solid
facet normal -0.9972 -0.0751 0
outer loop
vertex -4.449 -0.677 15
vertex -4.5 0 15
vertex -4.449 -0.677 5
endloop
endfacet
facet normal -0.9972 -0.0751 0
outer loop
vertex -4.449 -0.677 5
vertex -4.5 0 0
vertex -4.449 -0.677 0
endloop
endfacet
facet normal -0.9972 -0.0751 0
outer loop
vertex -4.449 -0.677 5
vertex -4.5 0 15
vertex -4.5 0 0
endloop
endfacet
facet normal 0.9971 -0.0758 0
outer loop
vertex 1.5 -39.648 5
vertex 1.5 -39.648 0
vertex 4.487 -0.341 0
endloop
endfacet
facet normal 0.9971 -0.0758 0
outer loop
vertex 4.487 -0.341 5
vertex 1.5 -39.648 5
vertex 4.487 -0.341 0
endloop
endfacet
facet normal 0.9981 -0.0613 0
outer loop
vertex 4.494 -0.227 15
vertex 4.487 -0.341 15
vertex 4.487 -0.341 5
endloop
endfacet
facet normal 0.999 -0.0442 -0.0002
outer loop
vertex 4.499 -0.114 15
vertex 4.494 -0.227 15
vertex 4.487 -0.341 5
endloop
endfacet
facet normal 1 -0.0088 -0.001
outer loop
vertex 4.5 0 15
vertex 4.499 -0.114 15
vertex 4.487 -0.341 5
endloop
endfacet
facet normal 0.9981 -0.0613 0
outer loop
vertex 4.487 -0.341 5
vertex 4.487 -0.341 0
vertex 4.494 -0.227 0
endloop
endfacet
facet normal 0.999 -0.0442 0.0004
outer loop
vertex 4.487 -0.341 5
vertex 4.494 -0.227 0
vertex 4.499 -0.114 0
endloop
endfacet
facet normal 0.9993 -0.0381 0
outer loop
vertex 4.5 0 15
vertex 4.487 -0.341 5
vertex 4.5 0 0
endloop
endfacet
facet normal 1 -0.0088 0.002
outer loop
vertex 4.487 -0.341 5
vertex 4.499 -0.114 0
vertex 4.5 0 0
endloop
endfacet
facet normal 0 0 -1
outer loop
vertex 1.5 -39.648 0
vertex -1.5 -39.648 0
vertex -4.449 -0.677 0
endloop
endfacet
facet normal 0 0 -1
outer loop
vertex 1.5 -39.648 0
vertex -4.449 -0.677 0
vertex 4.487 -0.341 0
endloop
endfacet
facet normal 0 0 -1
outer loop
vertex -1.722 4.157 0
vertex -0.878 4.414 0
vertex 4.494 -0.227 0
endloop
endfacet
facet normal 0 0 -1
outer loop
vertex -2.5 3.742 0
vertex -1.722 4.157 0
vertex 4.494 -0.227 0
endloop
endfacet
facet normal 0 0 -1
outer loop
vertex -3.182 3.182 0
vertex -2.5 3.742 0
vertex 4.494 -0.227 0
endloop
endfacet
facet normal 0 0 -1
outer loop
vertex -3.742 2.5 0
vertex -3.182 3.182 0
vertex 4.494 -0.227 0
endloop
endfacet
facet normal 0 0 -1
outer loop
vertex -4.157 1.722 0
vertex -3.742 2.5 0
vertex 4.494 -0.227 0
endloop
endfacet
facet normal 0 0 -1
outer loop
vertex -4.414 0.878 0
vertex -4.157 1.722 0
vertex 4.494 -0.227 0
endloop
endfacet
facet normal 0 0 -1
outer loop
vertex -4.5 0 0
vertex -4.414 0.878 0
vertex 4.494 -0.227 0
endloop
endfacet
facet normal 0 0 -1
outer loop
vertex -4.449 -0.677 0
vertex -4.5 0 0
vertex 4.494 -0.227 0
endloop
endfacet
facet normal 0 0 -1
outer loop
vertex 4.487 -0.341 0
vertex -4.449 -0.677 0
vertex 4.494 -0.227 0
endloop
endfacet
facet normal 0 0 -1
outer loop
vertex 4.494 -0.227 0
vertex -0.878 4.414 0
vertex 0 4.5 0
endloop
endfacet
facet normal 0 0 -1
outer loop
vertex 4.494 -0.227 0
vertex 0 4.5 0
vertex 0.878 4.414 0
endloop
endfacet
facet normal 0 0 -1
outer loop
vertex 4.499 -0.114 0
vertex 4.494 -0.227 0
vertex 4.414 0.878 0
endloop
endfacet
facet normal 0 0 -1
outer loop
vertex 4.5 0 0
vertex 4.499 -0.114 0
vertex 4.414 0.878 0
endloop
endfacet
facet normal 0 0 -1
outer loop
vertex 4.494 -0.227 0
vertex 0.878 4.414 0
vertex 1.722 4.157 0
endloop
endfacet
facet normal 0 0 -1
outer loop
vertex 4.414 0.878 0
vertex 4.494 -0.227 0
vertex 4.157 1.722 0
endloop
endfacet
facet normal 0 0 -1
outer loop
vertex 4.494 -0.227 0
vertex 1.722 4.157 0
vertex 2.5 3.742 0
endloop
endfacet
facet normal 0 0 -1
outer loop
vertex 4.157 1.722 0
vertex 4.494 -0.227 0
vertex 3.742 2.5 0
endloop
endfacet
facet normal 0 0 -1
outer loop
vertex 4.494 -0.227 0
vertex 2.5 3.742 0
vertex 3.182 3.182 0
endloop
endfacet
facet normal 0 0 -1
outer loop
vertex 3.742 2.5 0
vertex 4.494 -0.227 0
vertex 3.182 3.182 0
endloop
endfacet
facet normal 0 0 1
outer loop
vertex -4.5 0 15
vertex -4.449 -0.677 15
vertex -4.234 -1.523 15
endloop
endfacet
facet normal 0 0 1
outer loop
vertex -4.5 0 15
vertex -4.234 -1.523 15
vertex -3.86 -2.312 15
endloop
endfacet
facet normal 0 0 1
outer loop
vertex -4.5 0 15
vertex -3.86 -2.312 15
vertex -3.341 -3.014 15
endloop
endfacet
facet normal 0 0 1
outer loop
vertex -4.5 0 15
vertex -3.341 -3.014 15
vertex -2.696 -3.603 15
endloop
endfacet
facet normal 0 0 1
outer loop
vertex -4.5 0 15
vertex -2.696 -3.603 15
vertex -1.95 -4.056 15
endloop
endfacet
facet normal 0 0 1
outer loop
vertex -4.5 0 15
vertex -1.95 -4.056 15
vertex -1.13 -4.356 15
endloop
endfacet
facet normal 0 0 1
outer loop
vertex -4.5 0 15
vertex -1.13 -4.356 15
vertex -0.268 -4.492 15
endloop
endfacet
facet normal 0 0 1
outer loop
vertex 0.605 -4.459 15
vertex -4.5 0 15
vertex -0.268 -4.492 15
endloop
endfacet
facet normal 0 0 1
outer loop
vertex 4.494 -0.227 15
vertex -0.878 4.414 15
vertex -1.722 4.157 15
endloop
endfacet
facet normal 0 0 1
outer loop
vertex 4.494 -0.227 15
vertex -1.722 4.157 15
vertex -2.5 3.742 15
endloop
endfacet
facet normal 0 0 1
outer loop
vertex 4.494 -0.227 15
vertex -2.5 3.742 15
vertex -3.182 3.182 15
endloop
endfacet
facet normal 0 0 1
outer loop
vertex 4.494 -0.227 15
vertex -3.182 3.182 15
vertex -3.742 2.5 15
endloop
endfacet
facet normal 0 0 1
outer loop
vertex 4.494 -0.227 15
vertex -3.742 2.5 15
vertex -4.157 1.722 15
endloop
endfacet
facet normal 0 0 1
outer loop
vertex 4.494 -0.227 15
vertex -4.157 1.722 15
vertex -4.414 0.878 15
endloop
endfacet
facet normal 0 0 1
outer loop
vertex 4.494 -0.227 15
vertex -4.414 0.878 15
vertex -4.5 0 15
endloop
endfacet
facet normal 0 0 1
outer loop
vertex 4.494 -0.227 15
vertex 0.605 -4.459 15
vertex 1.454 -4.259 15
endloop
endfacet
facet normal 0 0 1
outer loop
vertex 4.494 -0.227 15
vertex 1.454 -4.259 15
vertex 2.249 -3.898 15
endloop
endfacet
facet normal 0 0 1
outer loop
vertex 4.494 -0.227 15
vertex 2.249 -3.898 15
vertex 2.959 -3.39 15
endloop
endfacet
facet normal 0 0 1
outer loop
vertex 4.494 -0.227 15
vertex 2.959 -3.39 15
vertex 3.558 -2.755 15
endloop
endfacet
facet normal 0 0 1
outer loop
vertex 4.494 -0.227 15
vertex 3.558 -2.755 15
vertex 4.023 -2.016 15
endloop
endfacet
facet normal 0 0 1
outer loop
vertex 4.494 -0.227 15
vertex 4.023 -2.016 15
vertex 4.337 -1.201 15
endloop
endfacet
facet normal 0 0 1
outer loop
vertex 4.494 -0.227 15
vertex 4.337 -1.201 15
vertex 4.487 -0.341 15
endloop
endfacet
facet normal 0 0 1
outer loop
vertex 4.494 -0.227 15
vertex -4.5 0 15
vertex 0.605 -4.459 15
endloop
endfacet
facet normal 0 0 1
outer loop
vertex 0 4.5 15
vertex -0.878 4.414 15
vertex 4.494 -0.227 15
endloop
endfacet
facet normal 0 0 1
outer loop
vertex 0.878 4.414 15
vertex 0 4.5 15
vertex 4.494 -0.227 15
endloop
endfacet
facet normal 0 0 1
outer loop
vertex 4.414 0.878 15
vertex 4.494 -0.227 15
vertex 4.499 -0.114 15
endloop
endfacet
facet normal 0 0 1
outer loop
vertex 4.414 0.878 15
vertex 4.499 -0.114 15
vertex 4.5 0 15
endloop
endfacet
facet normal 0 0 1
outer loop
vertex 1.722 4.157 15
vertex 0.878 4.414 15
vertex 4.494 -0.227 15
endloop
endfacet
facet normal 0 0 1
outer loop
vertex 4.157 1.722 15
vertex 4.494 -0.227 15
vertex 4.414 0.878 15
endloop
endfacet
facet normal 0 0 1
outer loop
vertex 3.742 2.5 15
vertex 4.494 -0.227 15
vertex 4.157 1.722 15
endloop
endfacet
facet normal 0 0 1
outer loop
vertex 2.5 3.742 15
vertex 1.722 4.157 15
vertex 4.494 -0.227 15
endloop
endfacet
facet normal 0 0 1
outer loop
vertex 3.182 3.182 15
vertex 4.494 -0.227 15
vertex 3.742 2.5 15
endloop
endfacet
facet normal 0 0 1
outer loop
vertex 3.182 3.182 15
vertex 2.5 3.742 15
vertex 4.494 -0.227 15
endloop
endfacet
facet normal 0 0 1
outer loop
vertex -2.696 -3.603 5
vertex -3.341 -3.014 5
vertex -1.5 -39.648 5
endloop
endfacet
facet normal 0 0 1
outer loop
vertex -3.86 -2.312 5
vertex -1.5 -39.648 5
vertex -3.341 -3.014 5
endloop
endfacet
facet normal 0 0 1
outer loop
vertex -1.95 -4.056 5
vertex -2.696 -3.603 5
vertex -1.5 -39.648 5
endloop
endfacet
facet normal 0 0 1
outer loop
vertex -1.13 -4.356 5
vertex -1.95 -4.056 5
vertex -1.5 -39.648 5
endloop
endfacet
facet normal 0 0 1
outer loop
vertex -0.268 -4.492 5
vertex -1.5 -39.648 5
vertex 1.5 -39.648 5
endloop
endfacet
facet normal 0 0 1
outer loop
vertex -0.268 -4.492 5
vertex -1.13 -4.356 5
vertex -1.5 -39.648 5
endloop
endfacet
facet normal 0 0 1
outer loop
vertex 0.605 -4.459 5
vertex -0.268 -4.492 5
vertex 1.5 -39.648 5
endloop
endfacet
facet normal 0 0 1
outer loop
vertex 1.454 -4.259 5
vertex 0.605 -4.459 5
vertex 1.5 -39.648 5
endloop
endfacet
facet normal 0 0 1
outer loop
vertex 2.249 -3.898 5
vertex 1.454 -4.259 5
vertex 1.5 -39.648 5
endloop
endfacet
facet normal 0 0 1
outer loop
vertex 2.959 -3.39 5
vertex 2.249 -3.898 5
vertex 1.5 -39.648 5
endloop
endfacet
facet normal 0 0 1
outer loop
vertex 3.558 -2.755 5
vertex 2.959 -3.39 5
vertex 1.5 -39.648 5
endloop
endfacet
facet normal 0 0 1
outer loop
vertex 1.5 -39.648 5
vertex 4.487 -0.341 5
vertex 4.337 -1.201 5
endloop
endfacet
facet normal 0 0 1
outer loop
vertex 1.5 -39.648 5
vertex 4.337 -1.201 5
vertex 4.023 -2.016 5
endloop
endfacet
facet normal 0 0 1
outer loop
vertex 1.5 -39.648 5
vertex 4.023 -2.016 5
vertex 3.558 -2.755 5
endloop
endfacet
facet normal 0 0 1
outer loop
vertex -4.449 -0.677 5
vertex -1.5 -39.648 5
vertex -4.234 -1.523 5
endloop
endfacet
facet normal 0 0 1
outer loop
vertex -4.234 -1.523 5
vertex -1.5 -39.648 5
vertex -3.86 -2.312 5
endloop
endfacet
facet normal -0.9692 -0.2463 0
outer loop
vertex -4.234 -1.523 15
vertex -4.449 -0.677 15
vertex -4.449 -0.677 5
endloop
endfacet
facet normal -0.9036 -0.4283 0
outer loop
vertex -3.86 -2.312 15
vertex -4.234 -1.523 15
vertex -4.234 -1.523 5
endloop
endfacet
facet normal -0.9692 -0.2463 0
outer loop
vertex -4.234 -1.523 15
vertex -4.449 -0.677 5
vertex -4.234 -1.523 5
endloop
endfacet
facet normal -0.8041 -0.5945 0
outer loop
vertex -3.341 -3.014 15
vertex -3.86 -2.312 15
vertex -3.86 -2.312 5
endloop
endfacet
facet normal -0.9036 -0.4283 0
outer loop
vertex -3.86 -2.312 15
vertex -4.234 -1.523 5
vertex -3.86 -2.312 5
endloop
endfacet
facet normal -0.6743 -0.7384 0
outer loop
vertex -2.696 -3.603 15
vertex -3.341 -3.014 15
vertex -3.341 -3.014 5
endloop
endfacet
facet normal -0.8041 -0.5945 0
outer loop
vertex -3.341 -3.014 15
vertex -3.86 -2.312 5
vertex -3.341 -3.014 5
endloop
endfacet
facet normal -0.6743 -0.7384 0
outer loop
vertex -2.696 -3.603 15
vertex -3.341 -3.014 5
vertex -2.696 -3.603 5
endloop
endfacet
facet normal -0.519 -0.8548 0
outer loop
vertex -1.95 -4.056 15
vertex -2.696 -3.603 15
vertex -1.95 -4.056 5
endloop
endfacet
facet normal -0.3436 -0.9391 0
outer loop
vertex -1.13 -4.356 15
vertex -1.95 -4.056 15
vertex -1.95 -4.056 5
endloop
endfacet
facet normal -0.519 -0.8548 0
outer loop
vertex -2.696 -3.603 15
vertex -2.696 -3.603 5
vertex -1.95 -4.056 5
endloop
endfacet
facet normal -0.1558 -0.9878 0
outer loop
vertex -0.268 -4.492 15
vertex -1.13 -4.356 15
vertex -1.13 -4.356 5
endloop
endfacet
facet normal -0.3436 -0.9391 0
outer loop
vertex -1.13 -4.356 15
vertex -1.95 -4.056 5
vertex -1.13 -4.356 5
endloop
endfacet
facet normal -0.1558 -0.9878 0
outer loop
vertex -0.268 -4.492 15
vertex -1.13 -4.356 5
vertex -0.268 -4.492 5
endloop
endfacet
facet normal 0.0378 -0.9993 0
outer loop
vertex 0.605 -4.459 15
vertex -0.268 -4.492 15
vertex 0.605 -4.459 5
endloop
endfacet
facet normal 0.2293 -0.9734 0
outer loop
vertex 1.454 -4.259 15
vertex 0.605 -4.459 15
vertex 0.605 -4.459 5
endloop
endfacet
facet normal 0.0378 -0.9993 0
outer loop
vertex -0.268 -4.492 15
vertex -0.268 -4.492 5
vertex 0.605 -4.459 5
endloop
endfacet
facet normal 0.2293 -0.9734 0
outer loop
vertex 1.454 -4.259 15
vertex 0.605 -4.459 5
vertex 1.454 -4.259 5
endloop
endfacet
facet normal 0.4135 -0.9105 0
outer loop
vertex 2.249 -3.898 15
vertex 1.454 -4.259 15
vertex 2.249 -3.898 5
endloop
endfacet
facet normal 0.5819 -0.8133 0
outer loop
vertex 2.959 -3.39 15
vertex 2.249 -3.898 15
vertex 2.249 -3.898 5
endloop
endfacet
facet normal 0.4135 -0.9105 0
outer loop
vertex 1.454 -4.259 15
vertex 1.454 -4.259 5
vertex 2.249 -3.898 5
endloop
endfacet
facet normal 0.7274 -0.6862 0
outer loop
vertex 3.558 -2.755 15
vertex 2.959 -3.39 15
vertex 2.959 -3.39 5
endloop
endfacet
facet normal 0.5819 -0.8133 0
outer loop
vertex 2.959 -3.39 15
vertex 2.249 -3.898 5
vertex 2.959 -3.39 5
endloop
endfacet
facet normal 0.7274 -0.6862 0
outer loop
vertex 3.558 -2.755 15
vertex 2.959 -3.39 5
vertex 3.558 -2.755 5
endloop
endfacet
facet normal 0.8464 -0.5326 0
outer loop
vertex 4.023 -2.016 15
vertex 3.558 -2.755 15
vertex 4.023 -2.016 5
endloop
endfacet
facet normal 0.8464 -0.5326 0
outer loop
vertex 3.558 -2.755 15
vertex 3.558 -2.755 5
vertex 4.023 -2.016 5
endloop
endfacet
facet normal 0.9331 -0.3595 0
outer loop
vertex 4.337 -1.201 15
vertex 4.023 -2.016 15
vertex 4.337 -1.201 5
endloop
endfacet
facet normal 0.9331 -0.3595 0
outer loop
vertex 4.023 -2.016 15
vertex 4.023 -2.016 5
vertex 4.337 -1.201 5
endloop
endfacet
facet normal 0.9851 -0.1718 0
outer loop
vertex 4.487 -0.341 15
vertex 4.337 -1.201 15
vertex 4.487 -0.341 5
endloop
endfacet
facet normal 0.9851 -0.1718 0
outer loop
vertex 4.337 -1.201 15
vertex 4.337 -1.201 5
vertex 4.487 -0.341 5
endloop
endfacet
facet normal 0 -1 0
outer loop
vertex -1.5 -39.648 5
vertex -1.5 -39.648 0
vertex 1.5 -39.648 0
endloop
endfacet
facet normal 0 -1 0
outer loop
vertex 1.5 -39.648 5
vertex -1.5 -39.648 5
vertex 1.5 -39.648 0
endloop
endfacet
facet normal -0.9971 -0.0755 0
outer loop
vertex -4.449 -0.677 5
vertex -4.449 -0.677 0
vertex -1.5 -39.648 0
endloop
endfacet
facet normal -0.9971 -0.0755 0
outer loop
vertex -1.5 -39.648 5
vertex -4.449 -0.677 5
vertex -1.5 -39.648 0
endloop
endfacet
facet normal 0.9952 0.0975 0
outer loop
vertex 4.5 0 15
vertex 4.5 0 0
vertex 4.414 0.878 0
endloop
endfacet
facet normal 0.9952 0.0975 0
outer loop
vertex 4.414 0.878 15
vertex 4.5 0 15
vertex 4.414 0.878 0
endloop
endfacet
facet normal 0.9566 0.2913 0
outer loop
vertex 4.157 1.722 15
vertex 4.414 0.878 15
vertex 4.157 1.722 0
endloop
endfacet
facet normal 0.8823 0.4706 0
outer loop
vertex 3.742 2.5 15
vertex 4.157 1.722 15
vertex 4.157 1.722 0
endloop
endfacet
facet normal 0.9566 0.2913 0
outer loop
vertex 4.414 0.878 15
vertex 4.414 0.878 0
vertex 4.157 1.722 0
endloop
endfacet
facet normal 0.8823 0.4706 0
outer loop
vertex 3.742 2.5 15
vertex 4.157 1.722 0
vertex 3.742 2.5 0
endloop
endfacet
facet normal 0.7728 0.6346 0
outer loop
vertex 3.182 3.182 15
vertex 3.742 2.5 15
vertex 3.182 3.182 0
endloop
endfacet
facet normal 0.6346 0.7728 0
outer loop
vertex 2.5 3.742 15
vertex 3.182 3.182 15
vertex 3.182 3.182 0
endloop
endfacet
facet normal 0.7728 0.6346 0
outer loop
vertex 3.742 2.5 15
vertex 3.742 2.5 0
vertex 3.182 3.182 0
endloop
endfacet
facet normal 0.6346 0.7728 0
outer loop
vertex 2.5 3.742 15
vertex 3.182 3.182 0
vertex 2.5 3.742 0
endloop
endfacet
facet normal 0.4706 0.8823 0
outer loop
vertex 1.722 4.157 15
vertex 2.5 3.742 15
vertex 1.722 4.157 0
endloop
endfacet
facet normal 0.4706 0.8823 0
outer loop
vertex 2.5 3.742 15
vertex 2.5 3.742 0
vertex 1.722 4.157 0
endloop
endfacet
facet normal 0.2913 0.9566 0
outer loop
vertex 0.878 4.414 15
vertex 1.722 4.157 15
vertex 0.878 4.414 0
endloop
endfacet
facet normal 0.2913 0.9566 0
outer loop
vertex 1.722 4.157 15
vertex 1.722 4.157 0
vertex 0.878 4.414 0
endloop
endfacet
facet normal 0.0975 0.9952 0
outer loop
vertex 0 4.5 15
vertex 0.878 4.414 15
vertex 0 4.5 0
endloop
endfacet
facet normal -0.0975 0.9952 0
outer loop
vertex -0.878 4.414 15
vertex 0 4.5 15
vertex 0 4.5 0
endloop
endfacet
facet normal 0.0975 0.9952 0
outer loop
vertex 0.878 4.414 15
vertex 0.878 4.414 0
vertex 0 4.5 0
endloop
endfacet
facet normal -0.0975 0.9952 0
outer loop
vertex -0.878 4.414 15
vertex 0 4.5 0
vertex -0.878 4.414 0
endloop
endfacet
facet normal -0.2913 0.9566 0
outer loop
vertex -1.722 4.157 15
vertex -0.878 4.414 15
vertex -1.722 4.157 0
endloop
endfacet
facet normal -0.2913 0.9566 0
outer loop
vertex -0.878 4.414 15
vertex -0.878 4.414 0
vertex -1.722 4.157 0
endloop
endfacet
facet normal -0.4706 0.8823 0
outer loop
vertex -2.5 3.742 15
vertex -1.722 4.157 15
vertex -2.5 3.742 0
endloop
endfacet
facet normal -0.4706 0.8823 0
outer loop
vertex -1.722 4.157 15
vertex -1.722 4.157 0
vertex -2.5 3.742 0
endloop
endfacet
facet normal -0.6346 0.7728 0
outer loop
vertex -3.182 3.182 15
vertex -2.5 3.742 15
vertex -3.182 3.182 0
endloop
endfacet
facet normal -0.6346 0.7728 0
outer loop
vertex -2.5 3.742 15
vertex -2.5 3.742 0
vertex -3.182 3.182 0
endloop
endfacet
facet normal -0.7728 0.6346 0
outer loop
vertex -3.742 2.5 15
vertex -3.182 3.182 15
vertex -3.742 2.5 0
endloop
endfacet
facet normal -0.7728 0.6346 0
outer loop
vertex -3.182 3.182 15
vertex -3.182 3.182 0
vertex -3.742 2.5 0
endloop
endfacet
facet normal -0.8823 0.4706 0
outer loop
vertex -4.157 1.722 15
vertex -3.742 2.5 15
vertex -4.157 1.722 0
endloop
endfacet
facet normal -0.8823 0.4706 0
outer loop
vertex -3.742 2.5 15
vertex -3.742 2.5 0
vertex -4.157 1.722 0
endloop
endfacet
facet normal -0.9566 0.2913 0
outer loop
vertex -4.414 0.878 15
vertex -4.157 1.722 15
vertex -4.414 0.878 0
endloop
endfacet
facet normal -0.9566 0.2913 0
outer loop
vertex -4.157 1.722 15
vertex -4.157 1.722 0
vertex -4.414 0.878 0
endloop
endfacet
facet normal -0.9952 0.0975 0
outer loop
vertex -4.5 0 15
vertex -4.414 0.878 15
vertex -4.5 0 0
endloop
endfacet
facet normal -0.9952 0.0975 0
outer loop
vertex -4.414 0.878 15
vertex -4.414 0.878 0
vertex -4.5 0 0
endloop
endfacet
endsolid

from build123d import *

# Parameters (mm, degrees)
F1_DEPTH = 5
F2_DEPTH = 15


with BuildPart() as f1:
    # F0 (on Top) → F1 (new body)
    with BuildSketch(Plane.XY):
        with BuildLine():
            Line((1.5, -39.647717), (4.487062, -0.340988))
            ThreePointArc((4.487062, -0.340988), (0.169154, -4.49682), (-4.448765, -0.677121))
            Line((-4.448765, -0.677121), (-1.5, -39.647717))
            Line((-1.5, -39.647717), (1.5, -39.647717))
        make_face()
    extrude(amount=F1_DEPTH)

    # F0 (on Top) → F2 (join)
    with BuildSketch(Plane.XY):
        with BuildLine():
            ThreePointArc((4.487062, -0.340988), (4.496764, -0.170617), (4.5, 0))
            ThreePointArc((4.5, 0), (0, 4.5), (-4.5, 0))
            Line((-4.5, 0), (-4.448765, -0.677121))
            ThreePointArc((-4.448765, -0.677121), (0.169154, -4.49682), (4.487062, -0.340988))
        make_face()
    extrude(amount=F2_DEPTH)


solid = f1.part
